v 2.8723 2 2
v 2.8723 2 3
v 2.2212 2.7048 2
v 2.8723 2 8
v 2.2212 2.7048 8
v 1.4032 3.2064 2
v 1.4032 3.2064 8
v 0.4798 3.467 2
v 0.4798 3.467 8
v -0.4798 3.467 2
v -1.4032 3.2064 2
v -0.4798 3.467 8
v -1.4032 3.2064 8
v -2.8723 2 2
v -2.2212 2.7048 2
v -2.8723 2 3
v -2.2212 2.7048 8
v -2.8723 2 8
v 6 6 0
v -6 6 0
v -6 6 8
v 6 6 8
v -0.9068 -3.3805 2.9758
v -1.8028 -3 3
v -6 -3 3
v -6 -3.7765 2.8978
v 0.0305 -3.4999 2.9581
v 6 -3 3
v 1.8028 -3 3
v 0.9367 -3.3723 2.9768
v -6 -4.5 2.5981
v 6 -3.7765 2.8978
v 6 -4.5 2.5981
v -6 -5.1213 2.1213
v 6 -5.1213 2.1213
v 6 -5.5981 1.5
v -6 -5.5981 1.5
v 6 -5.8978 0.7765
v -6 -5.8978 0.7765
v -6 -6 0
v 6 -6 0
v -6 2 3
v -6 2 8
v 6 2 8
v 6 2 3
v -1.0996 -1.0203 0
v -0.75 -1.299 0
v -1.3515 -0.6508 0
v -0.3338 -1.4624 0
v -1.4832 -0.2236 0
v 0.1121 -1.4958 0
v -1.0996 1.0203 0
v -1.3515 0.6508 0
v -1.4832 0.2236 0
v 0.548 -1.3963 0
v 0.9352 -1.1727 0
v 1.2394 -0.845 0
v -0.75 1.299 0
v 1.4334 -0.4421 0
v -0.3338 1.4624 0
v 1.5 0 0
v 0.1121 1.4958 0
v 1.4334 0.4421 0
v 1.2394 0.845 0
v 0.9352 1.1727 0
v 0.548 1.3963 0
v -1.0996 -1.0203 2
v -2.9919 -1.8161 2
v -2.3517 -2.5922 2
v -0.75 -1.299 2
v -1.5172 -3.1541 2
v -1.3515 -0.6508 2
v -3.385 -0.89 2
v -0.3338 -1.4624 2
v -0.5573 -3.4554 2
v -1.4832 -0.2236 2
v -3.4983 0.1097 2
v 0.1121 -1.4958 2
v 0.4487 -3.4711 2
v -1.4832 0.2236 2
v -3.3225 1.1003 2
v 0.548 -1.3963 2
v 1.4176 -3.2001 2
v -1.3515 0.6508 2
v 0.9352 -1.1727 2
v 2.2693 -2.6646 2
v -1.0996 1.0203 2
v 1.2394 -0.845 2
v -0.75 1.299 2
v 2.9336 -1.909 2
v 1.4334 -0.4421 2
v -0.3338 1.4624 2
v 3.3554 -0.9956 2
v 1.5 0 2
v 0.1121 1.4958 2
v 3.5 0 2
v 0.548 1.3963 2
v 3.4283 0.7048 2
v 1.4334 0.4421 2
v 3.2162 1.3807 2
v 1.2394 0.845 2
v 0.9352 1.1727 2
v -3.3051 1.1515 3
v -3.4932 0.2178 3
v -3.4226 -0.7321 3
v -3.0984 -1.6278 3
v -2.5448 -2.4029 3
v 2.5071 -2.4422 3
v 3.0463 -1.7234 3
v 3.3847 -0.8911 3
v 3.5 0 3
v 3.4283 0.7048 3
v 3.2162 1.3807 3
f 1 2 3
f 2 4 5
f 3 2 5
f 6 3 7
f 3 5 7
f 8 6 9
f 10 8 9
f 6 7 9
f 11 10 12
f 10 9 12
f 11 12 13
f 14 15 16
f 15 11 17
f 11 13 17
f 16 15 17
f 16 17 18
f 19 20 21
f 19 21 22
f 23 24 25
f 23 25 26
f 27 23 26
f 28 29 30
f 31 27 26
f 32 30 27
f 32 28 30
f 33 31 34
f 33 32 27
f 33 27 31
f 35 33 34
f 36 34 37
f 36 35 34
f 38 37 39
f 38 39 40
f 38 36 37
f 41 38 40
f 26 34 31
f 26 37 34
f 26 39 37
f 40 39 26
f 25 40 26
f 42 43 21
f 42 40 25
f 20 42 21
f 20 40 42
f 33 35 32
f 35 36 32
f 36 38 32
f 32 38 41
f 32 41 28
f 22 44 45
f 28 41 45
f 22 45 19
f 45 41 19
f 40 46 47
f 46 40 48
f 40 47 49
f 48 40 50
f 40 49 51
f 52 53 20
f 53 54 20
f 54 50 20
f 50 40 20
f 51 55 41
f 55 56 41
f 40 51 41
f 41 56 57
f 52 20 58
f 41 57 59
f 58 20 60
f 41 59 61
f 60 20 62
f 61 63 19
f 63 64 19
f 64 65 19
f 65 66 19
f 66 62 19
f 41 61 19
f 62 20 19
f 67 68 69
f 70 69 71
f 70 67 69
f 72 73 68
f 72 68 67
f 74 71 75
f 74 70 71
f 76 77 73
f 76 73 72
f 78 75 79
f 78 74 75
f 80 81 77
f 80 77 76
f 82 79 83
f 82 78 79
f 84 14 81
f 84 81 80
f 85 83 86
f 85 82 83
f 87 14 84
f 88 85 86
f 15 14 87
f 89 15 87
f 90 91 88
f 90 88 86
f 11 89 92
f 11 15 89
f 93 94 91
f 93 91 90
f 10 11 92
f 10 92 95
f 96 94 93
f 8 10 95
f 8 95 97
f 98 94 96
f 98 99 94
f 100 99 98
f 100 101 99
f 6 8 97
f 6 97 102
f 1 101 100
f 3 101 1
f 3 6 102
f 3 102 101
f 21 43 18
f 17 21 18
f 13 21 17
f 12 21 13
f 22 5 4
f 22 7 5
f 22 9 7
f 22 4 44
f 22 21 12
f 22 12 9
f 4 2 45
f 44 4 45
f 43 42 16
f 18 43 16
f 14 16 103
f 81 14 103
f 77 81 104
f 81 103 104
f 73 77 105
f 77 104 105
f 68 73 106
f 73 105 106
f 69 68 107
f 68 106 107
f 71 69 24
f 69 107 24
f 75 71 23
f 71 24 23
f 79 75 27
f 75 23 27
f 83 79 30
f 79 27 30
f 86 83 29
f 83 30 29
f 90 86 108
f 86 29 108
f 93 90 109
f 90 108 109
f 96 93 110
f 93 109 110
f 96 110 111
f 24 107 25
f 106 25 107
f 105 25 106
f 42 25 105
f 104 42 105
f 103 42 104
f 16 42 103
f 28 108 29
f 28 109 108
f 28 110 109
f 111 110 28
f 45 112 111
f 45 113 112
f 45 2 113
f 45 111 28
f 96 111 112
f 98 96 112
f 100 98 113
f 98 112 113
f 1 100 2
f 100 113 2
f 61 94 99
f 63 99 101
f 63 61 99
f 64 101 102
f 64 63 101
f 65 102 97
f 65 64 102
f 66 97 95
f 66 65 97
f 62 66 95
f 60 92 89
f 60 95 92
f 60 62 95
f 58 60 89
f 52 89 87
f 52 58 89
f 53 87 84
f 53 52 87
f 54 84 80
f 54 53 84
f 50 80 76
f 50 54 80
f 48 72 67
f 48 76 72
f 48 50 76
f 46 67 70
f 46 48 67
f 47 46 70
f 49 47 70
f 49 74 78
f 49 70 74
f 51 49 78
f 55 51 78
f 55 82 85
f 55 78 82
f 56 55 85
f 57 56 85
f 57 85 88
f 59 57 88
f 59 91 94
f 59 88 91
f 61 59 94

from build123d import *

# Parameters (mm, degrees)
F0_W     = 12
F0_H     = 12
F0_R     = 1.5
F1_DEPTH = 3
F2_W     = 12
F2_H     = 4
F3_DEPTH = 5
F5_R     = 2.99999
F6_DEPTH = 6


# Not quite as in the source:
# - a fillet or chamfer is up to 0.001 mm smaller than in the source, because OpenCascade refuses the exact size


with BuildPart() as f1:
    # F0 (on Top) → F1 (new body)
    with BuildSketch(Plane.XY):
        Rectangle(F0_W, F0_H)
        Circle(F0_R, mode=Mode.SUBTRACT)
    extrude(amount=F1_DEPTH)

    # F2 (on face) → F3 (join)
    with BuildSketch(Plane.XY.offset(3)):
        with Locations((0, 4)):
            Rectangle(F2_W, F2_H)
    extrude(amount=F3_DEPTH)

    # F5 (radius 3 in the source; OpenCascade refuses exactly that, so slightly less here)
    f5_edges = [f1.edges().sort_by_distance(p)[0] for p in [
        (0, -6, 3),
    ]]
    fillet(f5_edges, radius=F5_R)

    # F4 (on face) → F6 (cut)
    with BuildSketch(Plane.XY.offset(8)):
        with BuildLine():
            ThreePointArc((-2.8722813233, 2), (-1.0480971731, -3.3393850206), (3.5, 0))
            ThreePointArc((3.5, 0), (3.3393850206, 1.0480971731), (2.8722813233, 2))
            Line((2.8722813233, 2), (-2.8722813233, 2))
        make_face()
        with BuildLine():
            Line((-2.8722813233, 2), (2.8722813233, 2))
            ThreePointArc((2.8722813233, 2), (0, 3.5), (-2.8722813233, 2))
        make_face()
    extrude(amount=-F6_DEPTH, mode=Mode.SUBTRACT)


solid = f1.part
